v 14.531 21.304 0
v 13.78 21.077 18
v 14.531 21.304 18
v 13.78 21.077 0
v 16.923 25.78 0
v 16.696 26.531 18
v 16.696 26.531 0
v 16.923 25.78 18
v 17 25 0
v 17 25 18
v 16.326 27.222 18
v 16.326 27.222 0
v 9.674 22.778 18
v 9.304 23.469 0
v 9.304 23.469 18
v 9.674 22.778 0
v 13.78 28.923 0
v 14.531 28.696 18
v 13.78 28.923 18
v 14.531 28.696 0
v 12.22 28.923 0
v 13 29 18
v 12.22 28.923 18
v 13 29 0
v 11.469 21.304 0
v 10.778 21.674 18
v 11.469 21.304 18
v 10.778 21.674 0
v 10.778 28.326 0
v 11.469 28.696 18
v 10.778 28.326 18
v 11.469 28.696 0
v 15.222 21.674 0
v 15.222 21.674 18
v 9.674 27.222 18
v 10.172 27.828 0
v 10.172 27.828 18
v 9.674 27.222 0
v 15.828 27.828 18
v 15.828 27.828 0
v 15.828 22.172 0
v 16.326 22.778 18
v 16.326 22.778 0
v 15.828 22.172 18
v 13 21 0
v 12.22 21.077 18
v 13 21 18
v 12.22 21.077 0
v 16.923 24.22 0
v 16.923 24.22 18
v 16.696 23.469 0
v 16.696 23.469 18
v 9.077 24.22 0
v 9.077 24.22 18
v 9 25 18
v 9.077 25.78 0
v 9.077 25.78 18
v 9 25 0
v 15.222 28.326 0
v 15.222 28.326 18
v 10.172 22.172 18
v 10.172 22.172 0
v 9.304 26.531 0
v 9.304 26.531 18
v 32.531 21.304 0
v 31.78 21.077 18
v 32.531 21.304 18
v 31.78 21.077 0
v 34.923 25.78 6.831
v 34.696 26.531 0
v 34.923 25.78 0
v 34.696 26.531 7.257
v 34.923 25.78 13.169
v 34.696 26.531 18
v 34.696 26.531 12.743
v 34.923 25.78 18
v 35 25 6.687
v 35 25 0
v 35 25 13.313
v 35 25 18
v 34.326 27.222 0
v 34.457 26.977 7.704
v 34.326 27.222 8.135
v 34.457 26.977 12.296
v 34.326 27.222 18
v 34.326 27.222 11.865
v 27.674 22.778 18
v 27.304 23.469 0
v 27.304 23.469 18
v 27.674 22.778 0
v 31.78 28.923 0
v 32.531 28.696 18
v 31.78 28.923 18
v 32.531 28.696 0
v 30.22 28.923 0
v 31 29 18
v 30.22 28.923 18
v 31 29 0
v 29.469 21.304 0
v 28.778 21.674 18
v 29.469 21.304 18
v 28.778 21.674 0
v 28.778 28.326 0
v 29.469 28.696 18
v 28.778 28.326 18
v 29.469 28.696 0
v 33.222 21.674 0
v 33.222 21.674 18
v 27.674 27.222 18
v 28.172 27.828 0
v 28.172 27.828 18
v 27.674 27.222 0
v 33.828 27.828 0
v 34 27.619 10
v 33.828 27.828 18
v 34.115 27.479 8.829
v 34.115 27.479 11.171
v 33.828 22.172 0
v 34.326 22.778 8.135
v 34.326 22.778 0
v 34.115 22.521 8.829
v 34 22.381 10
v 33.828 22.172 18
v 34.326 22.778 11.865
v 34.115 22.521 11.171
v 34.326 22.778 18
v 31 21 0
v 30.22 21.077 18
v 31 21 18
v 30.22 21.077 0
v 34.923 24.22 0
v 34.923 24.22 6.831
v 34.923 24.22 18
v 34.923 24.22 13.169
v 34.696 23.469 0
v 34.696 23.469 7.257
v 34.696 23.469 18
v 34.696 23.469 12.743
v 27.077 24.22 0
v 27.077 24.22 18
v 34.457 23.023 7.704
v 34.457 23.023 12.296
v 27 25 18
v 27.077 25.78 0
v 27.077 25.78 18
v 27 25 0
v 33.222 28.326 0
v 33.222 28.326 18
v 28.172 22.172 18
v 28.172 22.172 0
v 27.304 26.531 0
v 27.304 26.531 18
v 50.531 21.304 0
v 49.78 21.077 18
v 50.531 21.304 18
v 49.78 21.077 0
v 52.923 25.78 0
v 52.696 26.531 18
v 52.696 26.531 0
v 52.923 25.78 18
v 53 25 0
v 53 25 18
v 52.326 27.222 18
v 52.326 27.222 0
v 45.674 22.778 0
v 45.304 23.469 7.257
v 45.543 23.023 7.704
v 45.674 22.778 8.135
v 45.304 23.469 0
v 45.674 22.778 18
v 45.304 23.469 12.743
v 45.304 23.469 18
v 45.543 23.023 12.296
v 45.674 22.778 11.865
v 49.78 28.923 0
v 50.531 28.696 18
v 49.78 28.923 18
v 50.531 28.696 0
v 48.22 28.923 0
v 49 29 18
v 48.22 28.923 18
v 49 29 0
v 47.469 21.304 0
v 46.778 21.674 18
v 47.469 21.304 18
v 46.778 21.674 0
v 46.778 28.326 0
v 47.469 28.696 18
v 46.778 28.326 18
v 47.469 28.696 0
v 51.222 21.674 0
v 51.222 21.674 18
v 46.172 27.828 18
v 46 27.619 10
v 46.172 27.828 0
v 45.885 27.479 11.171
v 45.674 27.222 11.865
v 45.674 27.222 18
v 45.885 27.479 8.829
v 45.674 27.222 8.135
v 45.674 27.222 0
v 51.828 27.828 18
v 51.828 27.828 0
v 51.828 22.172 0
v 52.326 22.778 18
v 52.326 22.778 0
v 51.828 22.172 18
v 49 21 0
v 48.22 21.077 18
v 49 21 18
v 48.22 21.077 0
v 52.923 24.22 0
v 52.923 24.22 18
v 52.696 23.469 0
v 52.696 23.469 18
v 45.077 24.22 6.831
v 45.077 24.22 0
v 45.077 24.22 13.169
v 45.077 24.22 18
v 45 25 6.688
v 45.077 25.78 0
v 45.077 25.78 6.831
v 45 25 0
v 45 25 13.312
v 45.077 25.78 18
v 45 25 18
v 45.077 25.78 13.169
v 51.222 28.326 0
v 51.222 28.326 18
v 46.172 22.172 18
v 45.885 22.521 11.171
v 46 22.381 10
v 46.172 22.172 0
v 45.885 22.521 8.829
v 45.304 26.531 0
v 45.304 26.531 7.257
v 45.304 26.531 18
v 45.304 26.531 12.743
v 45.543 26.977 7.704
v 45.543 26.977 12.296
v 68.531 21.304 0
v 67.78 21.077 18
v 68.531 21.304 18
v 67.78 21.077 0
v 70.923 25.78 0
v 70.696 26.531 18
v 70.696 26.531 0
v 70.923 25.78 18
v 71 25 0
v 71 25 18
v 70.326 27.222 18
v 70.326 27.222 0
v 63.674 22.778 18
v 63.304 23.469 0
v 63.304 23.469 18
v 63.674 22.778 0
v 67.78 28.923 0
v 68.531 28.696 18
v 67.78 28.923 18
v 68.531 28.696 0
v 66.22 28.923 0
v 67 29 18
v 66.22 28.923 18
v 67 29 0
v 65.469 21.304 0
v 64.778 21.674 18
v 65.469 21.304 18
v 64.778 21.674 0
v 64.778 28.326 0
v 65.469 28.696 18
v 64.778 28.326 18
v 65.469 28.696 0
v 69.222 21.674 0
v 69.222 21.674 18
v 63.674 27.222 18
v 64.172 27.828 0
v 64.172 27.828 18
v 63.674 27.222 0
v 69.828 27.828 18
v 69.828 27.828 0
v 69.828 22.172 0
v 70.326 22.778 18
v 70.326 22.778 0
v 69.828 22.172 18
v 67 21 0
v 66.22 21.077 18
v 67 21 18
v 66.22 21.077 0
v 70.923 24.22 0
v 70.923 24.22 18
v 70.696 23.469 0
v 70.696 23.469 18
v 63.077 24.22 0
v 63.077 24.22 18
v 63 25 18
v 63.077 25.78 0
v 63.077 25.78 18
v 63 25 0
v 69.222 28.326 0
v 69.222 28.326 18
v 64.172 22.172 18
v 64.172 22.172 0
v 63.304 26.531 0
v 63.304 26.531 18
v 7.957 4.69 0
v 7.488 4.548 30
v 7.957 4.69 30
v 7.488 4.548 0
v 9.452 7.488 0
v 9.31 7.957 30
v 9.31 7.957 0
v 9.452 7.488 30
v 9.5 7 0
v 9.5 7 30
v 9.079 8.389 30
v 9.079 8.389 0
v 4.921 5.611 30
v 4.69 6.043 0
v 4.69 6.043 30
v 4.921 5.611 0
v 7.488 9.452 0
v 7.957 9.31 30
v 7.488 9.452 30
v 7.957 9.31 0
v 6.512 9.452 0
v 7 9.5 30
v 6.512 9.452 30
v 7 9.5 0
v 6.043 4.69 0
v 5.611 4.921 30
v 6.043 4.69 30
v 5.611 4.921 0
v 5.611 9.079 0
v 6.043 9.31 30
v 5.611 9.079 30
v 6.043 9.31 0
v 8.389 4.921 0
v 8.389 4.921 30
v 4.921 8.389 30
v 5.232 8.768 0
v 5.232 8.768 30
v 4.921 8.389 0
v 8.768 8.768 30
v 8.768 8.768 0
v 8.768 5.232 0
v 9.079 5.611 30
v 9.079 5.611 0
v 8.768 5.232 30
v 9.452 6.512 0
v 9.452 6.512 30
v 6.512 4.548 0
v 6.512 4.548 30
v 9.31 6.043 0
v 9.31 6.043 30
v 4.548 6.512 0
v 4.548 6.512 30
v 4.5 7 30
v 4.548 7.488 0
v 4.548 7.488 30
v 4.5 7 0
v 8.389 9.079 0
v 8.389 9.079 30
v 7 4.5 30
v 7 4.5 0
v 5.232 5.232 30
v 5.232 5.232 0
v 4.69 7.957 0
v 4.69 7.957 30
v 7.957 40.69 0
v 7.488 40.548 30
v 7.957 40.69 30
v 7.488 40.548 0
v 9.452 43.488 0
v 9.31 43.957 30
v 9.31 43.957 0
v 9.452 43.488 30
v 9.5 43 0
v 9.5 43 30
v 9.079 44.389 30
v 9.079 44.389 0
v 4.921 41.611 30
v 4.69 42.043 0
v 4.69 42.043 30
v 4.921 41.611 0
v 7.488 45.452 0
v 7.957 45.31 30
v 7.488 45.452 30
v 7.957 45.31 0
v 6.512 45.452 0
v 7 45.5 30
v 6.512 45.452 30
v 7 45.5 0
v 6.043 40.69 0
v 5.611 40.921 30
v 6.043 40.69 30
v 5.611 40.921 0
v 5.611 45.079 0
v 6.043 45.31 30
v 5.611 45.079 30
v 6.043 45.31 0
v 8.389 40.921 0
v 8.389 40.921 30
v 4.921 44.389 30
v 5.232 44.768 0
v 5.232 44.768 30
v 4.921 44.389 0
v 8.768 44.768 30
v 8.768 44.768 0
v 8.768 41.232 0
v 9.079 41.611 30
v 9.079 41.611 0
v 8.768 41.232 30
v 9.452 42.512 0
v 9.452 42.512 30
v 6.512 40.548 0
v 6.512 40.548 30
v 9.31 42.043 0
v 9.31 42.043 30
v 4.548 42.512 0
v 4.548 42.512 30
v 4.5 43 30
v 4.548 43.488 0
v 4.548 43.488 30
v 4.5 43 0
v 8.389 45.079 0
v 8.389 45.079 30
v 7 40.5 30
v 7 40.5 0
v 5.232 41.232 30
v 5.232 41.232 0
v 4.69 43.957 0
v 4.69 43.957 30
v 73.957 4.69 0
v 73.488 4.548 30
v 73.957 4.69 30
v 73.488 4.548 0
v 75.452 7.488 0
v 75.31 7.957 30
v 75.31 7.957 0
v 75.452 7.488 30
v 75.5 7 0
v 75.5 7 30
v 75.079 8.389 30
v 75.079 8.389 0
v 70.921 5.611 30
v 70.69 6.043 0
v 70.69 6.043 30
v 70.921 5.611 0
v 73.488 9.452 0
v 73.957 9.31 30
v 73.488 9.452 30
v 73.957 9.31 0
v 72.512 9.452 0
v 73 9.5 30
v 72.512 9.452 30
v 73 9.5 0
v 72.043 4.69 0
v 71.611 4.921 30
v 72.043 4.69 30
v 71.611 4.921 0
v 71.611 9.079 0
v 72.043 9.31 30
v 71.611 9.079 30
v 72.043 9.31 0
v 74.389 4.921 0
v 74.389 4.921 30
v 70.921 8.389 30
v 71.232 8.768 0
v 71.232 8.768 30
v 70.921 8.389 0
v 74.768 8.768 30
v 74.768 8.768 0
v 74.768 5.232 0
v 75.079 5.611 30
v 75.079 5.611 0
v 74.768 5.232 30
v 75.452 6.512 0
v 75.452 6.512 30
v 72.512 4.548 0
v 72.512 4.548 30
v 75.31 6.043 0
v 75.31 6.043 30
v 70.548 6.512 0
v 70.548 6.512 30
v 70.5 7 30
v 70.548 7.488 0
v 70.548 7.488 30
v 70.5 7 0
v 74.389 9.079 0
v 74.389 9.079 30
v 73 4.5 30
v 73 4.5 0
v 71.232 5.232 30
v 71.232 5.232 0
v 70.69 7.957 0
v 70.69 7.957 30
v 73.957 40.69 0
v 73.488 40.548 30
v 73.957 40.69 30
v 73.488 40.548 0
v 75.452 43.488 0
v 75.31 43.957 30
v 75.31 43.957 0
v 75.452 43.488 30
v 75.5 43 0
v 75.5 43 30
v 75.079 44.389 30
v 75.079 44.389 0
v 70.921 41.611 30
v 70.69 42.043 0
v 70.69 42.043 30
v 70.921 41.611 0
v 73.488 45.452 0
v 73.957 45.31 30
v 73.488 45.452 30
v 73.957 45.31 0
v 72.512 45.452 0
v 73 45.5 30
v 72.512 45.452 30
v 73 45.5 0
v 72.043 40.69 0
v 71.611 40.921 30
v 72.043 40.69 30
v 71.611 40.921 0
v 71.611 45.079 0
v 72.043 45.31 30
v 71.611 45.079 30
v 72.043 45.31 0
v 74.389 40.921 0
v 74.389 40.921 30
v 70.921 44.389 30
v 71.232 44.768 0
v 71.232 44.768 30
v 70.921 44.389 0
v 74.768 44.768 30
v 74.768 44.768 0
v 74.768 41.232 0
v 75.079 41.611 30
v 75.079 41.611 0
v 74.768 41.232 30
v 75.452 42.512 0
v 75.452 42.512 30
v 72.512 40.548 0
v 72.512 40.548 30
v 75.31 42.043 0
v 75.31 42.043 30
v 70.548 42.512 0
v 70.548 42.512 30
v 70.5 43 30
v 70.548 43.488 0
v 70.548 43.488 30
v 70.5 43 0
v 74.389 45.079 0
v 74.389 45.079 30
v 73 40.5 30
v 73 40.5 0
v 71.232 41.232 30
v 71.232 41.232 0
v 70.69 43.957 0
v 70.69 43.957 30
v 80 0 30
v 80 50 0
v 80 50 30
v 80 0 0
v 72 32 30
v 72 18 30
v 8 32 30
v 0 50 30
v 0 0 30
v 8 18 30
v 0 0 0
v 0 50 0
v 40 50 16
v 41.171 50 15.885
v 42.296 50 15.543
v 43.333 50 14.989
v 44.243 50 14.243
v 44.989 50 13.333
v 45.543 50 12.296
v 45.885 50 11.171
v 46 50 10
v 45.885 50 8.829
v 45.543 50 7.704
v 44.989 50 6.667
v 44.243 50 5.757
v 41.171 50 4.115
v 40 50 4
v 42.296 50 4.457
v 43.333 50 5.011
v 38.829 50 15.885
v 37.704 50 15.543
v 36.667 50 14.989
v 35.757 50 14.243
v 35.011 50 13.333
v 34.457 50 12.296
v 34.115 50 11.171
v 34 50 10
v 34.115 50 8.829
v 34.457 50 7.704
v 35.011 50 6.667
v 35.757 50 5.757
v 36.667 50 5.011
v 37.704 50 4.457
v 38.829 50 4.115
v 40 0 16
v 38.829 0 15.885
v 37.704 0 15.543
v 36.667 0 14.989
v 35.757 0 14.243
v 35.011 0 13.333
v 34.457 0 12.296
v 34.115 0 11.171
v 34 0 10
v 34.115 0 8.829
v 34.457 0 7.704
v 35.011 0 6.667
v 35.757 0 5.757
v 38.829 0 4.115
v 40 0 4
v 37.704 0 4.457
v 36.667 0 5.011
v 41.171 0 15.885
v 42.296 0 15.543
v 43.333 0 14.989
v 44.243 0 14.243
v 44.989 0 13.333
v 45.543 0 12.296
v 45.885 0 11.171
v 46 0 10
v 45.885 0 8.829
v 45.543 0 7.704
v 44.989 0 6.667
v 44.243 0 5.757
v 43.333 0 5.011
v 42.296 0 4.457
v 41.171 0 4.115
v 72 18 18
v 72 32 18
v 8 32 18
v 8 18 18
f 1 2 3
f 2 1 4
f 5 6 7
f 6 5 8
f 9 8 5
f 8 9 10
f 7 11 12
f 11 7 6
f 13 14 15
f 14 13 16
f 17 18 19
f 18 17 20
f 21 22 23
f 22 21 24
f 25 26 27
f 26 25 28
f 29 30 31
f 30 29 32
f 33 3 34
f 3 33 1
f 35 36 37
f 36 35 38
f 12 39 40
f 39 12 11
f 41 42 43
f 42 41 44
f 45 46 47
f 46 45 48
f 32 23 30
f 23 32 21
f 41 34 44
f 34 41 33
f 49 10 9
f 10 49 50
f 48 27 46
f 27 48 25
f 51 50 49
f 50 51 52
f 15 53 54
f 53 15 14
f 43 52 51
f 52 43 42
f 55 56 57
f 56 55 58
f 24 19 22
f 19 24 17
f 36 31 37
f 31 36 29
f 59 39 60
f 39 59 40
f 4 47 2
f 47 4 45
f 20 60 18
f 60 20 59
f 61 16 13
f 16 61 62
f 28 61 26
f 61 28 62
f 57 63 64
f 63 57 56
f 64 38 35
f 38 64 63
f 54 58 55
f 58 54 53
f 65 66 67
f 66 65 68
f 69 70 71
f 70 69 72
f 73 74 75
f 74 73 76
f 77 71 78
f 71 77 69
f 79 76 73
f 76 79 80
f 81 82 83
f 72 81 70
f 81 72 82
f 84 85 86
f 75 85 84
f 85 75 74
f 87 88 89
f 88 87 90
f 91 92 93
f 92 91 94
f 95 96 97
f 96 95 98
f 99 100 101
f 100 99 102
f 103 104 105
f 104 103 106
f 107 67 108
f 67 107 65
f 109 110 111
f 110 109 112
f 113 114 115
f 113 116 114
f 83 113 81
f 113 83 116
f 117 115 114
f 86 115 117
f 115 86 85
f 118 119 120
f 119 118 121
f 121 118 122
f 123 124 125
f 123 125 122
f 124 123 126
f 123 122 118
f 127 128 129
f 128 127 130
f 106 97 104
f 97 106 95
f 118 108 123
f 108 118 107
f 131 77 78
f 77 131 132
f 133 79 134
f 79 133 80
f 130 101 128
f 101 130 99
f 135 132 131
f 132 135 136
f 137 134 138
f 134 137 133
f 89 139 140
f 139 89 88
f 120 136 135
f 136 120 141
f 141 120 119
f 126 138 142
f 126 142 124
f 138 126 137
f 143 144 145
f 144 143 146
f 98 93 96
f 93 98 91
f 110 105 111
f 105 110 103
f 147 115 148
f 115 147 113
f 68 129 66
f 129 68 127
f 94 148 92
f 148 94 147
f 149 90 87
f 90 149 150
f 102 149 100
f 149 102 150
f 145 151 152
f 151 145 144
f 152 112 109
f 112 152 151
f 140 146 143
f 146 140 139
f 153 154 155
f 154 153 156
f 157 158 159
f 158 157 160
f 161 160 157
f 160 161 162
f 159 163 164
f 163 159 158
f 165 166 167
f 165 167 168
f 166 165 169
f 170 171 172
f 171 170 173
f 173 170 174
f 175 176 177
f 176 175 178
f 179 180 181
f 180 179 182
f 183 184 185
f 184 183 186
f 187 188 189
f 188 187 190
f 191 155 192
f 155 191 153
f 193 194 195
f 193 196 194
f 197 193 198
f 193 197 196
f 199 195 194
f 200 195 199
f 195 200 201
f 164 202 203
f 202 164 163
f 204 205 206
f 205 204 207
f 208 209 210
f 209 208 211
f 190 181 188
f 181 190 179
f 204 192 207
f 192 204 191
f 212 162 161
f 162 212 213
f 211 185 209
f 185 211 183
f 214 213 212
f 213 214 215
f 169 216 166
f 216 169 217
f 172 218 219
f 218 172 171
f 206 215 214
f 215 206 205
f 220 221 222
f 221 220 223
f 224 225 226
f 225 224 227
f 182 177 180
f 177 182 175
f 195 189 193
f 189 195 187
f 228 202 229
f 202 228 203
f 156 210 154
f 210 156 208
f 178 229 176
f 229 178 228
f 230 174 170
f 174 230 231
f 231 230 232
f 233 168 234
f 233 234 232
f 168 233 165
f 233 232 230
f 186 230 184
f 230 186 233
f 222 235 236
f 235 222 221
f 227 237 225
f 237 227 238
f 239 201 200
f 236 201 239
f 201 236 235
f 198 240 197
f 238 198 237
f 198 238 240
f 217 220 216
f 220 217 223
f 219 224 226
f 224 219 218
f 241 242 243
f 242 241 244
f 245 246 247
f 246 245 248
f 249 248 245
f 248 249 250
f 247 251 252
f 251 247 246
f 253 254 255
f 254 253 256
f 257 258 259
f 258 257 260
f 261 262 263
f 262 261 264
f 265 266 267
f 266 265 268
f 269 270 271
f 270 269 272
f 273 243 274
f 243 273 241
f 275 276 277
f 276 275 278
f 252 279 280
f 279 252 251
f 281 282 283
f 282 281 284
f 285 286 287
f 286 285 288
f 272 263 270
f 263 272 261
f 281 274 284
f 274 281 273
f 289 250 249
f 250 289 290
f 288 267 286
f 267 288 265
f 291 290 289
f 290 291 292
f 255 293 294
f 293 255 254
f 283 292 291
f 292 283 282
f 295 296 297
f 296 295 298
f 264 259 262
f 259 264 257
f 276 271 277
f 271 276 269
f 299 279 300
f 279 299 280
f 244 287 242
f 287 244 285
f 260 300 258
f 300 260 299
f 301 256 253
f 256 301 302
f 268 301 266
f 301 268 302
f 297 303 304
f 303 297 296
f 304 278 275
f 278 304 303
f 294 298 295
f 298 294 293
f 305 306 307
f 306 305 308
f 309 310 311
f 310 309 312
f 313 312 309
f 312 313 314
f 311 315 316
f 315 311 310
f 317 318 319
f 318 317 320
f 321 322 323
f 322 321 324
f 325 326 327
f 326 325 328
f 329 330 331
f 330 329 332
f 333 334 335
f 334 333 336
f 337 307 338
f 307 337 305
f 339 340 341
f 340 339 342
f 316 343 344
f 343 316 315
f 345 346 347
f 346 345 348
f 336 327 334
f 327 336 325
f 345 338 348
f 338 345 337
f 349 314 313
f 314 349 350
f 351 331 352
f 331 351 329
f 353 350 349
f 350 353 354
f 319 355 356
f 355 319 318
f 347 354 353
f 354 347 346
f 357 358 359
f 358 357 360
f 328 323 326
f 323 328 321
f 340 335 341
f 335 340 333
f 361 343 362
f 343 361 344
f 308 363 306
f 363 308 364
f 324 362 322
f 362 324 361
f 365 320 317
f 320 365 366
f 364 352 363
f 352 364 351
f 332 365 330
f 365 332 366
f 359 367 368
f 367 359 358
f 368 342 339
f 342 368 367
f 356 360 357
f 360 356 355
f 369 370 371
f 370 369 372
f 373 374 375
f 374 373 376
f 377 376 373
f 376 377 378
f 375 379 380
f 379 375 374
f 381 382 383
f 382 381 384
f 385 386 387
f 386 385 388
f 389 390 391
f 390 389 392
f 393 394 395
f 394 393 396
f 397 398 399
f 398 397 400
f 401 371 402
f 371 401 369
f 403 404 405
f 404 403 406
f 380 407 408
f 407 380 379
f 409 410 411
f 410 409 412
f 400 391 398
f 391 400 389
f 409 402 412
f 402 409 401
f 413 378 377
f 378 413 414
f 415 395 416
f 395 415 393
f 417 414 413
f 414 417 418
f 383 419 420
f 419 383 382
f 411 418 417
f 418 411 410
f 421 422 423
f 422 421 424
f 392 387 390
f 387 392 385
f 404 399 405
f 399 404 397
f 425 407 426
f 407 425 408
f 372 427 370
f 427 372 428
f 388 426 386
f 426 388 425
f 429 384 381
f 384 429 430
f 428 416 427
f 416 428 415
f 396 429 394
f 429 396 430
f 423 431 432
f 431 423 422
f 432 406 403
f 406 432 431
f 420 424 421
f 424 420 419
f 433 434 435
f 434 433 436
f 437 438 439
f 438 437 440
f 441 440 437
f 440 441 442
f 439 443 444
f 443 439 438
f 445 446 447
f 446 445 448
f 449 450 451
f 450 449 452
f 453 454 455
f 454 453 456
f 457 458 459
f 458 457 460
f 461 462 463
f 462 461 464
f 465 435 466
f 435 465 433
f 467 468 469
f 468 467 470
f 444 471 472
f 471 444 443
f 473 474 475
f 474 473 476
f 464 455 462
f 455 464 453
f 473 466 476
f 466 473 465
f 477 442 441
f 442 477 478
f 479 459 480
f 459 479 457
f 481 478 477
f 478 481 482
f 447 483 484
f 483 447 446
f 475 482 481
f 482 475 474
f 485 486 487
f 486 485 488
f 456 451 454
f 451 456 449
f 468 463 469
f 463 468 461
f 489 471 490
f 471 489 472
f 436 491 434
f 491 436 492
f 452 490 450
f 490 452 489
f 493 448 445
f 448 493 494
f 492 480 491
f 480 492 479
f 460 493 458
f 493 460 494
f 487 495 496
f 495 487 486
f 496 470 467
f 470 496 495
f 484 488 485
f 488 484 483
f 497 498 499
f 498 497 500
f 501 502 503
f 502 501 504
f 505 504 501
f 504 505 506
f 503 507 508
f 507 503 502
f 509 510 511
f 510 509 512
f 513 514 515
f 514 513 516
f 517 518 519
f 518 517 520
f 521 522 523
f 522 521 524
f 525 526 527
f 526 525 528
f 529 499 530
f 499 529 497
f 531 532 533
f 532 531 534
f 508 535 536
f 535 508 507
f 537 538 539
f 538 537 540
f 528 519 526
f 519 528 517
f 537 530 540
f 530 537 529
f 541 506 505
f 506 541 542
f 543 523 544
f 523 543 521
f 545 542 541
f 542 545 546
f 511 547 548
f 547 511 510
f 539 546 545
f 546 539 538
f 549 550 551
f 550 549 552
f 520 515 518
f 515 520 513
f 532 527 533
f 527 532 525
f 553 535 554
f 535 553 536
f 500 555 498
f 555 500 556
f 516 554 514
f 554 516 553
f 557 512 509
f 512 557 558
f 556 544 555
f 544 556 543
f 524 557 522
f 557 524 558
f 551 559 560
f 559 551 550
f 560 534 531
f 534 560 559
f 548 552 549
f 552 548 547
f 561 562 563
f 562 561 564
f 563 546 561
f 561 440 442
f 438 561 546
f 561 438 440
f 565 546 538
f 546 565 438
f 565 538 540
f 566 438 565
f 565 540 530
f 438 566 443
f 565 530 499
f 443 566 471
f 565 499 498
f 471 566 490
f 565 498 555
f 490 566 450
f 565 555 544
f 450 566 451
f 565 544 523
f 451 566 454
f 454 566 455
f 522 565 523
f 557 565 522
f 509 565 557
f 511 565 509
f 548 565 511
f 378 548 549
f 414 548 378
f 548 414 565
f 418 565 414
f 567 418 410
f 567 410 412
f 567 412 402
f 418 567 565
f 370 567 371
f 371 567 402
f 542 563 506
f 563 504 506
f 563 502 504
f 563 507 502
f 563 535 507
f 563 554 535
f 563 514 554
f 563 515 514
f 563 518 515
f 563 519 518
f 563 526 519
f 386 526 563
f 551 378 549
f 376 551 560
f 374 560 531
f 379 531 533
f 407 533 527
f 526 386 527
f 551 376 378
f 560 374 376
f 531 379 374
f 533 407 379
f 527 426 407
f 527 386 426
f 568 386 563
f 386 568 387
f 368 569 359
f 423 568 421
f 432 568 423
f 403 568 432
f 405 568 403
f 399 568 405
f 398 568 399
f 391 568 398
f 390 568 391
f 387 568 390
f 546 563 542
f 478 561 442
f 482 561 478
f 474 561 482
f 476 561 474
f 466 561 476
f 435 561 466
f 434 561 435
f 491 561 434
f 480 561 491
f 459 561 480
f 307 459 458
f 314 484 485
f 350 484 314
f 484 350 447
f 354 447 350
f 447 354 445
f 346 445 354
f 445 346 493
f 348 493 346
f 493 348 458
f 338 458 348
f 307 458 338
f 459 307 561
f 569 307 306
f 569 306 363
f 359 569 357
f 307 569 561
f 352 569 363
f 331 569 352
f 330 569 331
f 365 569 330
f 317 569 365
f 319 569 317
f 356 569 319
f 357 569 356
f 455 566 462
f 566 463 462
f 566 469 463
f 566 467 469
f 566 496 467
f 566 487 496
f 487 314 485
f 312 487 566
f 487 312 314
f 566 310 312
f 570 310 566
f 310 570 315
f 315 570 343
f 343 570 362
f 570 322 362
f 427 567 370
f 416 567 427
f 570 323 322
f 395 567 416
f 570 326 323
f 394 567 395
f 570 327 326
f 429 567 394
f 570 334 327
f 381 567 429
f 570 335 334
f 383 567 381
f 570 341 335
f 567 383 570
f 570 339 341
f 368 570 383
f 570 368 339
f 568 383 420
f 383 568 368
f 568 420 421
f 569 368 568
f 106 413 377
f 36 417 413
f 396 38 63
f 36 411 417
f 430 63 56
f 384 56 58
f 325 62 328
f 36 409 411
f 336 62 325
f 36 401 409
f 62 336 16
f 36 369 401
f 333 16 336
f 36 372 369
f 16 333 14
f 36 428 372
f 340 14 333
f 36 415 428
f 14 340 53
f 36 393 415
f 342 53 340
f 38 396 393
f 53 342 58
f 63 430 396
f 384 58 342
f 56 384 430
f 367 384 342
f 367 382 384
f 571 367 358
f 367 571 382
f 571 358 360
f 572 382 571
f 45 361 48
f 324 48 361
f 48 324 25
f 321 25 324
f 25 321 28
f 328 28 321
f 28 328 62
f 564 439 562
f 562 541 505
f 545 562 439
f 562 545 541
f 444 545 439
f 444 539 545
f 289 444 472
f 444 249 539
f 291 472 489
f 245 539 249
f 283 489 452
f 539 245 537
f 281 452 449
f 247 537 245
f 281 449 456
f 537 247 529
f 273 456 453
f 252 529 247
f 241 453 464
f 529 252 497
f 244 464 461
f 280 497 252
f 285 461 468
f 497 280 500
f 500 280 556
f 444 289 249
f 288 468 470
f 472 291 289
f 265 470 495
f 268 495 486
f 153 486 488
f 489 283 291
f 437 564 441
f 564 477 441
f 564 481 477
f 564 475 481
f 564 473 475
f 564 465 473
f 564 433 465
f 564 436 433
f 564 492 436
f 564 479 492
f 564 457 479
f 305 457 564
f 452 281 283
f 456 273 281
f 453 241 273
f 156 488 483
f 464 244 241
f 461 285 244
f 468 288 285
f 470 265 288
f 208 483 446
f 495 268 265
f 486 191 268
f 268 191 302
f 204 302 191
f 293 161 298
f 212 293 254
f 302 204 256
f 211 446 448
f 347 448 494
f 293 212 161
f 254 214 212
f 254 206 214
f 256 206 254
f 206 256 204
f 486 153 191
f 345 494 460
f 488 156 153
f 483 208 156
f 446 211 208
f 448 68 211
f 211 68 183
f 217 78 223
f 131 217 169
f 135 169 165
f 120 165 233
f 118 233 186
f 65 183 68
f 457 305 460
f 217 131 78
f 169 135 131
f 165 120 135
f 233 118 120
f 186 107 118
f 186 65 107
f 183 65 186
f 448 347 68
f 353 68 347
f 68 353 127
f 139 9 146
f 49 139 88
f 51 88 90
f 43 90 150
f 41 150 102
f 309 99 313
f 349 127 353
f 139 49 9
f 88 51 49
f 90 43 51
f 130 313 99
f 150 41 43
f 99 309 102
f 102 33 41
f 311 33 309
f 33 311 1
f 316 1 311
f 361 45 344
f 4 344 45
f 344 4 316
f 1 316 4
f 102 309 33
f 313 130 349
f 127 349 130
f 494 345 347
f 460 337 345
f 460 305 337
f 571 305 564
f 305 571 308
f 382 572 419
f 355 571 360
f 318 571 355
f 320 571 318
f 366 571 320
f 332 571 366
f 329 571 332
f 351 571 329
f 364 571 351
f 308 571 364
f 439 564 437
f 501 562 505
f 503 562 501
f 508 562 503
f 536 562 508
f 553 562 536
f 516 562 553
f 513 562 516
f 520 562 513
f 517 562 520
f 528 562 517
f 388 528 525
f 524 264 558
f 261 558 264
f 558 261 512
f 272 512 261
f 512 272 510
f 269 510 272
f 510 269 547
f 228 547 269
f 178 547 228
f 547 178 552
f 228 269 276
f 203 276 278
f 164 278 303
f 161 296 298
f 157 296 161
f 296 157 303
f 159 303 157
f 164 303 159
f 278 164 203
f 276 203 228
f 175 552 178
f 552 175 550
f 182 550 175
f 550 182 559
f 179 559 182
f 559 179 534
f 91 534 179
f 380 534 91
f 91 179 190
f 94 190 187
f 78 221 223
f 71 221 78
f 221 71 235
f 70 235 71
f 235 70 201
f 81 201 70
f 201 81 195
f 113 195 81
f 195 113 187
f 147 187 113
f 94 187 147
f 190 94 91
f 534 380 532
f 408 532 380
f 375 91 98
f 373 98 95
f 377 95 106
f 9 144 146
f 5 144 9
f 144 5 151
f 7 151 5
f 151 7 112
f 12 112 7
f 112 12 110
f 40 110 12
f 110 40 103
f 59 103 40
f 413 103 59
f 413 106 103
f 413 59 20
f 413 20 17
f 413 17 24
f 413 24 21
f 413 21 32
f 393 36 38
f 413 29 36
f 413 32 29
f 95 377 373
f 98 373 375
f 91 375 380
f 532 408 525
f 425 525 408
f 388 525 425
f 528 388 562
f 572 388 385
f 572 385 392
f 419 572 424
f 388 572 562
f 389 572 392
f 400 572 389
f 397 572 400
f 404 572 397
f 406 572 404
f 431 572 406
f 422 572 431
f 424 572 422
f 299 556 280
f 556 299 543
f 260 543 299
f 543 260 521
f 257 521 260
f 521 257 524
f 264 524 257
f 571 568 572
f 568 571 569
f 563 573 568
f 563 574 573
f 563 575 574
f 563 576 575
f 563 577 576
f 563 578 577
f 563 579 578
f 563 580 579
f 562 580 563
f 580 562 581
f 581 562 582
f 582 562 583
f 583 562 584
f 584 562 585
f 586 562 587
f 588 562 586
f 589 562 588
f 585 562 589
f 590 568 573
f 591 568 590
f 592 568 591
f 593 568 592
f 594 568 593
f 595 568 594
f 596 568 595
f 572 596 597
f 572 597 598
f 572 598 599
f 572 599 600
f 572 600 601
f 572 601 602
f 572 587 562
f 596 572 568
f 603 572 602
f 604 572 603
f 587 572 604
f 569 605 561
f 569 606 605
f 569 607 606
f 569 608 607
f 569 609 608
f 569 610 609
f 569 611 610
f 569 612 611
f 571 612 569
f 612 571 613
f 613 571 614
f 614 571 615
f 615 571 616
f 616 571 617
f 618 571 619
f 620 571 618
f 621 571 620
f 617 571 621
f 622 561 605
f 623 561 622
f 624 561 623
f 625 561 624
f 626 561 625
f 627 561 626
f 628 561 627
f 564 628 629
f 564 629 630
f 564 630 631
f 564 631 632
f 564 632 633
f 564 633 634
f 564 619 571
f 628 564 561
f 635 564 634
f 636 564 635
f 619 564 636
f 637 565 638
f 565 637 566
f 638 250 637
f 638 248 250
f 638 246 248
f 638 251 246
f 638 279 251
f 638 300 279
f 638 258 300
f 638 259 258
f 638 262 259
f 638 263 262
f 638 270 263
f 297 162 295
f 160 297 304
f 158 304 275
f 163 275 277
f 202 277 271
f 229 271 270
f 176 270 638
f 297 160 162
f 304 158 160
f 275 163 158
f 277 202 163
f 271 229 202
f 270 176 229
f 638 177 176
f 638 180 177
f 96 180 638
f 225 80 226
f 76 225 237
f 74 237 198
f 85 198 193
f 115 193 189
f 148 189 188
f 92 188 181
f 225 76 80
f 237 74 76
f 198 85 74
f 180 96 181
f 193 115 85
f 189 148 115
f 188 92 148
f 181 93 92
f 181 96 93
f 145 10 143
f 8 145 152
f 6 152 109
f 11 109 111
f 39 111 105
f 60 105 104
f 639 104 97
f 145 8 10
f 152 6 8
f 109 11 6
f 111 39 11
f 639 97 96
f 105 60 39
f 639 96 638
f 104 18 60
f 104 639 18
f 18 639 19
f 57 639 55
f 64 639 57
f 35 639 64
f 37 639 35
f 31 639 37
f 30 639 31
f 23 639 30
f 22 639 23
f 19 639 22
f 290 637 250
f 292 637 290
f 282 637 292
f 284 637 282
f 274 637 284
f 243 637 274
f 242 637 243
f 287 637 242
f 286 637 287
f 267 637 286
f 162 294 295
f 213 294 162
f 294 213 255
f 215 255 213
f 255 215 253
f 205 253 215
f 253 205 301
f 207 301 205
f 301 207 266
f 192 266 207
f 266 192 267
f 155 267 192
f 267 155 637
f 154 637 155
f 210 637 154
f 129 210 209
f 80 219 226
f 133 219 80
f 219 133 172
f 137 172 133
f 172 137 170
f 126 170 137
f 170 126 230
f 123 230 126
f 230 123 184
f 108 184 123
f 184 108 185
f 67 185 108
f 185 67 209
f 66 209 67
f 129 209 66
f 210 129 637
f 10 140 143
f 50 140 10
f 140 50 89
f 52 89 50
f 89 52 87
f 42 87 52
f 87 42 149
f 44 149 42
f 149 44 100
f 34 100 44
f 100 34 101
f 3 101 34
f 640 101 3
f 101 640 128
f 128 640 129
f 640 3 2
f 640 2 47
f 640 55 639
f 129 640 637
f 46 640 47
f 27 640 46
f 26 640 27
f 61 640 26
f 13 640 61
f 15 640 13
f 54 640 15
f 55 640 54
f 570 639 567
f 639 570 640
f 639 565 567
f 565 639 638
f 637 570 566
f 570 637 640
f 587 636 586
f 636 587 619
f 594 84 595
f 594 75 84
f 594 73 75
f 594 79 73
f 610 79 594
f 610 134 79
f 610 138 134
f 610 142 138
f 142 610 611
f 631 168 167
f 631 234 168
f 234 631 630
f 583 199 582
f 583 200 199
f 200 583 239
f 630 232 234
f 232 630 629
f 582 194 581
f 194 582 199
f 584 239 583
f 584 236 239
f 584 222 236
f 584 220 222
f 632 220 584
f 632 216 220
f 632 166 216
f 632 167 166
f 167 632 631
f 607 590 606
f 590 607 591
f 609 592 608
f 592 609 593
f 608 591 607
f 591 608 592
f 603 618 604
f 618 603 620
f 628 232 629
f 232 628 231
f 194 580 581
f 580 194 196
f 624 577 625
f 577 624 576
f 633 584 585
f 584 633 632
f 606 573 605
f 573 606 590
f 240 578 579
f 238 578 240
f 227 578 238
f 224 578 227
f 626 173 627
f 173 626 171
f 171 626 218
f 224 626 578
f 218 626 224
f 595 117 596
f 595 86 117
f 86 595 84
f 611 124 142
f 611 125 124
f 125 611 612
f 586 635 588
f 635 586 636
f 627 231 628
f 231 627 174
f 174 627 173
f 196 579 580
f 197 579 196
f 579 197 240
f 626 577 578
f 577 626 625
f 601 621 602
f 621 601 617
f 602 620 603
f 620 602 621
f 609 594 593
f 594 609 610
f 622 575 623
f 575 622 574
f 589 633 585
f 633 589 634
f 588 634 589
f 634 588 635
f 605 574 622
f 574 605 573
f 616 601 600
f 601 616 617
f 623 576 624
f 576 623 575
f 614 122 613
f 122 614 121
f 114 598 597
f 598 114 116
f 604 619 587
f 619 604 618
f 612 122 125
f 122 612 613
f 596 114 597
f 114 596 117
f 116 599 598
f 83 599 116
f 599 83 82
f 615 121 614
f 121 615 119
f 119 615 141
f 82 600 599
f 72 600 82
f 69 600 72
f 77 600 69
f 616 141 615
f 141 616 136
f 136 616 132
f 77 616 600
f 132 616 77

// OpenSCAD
$fn = 32;

// ----------------------------------------------------------------------
// Manifold block: side_outlet manifold
// ----------------------------------------------------------------------

// --- parameters (mm) ---
block_l = 80;             // block length, X
block_w = 50;             // block width, Y
block_h = 30;             // block height, Z
port_d = 8;               // port bore diameter
port_pitch = 18;          // port pitch along X
gallery_d = 14;           // top gallery width, Y
gallery_depth = 12;       // gallery pocket depth
wall_p = 8;               // gallery end wall thickness, X
mnt_d = 5;                // mounting hole diameter
mnt_in = 7;               // mounting hole inset from the edges
out_d = 12;               // outlet bore diameter
out_z = 10;               // outlet axis height

n_ports = 4;  // ports in the row
port_x0 = (block_l - (n_ports - 1) * port_pitch) / 2;  // first port X

difference() {
  cube([block_l, block_w, block_h]);
  for (i = [0 : n_ports - 1])
    translate([port_x0 + i * port_pitch, block_w / 2, -1])
      cylinder(h = block_h + 2, d = port_d);
  translate([wall_p, block_w / 2 - gallery_d / 2, block_h - gallery_depth])
    cube([block_l - 2 * wall_p, gallery_d, gallery_depth + 1]);
  for (cx = [mnt_in, block_l - mnt_in])
    for (cy = [mnt_in, block_w - mnt_in])
      translate([cx, cy, -1]) cylinder(h = block_h + 2, d = mnt_d);
  translate([block_l / 2, -1, out_z]) rotate([-90, 0, 0])
    cylinder(h = block_w + 2, d = out_d);
}
